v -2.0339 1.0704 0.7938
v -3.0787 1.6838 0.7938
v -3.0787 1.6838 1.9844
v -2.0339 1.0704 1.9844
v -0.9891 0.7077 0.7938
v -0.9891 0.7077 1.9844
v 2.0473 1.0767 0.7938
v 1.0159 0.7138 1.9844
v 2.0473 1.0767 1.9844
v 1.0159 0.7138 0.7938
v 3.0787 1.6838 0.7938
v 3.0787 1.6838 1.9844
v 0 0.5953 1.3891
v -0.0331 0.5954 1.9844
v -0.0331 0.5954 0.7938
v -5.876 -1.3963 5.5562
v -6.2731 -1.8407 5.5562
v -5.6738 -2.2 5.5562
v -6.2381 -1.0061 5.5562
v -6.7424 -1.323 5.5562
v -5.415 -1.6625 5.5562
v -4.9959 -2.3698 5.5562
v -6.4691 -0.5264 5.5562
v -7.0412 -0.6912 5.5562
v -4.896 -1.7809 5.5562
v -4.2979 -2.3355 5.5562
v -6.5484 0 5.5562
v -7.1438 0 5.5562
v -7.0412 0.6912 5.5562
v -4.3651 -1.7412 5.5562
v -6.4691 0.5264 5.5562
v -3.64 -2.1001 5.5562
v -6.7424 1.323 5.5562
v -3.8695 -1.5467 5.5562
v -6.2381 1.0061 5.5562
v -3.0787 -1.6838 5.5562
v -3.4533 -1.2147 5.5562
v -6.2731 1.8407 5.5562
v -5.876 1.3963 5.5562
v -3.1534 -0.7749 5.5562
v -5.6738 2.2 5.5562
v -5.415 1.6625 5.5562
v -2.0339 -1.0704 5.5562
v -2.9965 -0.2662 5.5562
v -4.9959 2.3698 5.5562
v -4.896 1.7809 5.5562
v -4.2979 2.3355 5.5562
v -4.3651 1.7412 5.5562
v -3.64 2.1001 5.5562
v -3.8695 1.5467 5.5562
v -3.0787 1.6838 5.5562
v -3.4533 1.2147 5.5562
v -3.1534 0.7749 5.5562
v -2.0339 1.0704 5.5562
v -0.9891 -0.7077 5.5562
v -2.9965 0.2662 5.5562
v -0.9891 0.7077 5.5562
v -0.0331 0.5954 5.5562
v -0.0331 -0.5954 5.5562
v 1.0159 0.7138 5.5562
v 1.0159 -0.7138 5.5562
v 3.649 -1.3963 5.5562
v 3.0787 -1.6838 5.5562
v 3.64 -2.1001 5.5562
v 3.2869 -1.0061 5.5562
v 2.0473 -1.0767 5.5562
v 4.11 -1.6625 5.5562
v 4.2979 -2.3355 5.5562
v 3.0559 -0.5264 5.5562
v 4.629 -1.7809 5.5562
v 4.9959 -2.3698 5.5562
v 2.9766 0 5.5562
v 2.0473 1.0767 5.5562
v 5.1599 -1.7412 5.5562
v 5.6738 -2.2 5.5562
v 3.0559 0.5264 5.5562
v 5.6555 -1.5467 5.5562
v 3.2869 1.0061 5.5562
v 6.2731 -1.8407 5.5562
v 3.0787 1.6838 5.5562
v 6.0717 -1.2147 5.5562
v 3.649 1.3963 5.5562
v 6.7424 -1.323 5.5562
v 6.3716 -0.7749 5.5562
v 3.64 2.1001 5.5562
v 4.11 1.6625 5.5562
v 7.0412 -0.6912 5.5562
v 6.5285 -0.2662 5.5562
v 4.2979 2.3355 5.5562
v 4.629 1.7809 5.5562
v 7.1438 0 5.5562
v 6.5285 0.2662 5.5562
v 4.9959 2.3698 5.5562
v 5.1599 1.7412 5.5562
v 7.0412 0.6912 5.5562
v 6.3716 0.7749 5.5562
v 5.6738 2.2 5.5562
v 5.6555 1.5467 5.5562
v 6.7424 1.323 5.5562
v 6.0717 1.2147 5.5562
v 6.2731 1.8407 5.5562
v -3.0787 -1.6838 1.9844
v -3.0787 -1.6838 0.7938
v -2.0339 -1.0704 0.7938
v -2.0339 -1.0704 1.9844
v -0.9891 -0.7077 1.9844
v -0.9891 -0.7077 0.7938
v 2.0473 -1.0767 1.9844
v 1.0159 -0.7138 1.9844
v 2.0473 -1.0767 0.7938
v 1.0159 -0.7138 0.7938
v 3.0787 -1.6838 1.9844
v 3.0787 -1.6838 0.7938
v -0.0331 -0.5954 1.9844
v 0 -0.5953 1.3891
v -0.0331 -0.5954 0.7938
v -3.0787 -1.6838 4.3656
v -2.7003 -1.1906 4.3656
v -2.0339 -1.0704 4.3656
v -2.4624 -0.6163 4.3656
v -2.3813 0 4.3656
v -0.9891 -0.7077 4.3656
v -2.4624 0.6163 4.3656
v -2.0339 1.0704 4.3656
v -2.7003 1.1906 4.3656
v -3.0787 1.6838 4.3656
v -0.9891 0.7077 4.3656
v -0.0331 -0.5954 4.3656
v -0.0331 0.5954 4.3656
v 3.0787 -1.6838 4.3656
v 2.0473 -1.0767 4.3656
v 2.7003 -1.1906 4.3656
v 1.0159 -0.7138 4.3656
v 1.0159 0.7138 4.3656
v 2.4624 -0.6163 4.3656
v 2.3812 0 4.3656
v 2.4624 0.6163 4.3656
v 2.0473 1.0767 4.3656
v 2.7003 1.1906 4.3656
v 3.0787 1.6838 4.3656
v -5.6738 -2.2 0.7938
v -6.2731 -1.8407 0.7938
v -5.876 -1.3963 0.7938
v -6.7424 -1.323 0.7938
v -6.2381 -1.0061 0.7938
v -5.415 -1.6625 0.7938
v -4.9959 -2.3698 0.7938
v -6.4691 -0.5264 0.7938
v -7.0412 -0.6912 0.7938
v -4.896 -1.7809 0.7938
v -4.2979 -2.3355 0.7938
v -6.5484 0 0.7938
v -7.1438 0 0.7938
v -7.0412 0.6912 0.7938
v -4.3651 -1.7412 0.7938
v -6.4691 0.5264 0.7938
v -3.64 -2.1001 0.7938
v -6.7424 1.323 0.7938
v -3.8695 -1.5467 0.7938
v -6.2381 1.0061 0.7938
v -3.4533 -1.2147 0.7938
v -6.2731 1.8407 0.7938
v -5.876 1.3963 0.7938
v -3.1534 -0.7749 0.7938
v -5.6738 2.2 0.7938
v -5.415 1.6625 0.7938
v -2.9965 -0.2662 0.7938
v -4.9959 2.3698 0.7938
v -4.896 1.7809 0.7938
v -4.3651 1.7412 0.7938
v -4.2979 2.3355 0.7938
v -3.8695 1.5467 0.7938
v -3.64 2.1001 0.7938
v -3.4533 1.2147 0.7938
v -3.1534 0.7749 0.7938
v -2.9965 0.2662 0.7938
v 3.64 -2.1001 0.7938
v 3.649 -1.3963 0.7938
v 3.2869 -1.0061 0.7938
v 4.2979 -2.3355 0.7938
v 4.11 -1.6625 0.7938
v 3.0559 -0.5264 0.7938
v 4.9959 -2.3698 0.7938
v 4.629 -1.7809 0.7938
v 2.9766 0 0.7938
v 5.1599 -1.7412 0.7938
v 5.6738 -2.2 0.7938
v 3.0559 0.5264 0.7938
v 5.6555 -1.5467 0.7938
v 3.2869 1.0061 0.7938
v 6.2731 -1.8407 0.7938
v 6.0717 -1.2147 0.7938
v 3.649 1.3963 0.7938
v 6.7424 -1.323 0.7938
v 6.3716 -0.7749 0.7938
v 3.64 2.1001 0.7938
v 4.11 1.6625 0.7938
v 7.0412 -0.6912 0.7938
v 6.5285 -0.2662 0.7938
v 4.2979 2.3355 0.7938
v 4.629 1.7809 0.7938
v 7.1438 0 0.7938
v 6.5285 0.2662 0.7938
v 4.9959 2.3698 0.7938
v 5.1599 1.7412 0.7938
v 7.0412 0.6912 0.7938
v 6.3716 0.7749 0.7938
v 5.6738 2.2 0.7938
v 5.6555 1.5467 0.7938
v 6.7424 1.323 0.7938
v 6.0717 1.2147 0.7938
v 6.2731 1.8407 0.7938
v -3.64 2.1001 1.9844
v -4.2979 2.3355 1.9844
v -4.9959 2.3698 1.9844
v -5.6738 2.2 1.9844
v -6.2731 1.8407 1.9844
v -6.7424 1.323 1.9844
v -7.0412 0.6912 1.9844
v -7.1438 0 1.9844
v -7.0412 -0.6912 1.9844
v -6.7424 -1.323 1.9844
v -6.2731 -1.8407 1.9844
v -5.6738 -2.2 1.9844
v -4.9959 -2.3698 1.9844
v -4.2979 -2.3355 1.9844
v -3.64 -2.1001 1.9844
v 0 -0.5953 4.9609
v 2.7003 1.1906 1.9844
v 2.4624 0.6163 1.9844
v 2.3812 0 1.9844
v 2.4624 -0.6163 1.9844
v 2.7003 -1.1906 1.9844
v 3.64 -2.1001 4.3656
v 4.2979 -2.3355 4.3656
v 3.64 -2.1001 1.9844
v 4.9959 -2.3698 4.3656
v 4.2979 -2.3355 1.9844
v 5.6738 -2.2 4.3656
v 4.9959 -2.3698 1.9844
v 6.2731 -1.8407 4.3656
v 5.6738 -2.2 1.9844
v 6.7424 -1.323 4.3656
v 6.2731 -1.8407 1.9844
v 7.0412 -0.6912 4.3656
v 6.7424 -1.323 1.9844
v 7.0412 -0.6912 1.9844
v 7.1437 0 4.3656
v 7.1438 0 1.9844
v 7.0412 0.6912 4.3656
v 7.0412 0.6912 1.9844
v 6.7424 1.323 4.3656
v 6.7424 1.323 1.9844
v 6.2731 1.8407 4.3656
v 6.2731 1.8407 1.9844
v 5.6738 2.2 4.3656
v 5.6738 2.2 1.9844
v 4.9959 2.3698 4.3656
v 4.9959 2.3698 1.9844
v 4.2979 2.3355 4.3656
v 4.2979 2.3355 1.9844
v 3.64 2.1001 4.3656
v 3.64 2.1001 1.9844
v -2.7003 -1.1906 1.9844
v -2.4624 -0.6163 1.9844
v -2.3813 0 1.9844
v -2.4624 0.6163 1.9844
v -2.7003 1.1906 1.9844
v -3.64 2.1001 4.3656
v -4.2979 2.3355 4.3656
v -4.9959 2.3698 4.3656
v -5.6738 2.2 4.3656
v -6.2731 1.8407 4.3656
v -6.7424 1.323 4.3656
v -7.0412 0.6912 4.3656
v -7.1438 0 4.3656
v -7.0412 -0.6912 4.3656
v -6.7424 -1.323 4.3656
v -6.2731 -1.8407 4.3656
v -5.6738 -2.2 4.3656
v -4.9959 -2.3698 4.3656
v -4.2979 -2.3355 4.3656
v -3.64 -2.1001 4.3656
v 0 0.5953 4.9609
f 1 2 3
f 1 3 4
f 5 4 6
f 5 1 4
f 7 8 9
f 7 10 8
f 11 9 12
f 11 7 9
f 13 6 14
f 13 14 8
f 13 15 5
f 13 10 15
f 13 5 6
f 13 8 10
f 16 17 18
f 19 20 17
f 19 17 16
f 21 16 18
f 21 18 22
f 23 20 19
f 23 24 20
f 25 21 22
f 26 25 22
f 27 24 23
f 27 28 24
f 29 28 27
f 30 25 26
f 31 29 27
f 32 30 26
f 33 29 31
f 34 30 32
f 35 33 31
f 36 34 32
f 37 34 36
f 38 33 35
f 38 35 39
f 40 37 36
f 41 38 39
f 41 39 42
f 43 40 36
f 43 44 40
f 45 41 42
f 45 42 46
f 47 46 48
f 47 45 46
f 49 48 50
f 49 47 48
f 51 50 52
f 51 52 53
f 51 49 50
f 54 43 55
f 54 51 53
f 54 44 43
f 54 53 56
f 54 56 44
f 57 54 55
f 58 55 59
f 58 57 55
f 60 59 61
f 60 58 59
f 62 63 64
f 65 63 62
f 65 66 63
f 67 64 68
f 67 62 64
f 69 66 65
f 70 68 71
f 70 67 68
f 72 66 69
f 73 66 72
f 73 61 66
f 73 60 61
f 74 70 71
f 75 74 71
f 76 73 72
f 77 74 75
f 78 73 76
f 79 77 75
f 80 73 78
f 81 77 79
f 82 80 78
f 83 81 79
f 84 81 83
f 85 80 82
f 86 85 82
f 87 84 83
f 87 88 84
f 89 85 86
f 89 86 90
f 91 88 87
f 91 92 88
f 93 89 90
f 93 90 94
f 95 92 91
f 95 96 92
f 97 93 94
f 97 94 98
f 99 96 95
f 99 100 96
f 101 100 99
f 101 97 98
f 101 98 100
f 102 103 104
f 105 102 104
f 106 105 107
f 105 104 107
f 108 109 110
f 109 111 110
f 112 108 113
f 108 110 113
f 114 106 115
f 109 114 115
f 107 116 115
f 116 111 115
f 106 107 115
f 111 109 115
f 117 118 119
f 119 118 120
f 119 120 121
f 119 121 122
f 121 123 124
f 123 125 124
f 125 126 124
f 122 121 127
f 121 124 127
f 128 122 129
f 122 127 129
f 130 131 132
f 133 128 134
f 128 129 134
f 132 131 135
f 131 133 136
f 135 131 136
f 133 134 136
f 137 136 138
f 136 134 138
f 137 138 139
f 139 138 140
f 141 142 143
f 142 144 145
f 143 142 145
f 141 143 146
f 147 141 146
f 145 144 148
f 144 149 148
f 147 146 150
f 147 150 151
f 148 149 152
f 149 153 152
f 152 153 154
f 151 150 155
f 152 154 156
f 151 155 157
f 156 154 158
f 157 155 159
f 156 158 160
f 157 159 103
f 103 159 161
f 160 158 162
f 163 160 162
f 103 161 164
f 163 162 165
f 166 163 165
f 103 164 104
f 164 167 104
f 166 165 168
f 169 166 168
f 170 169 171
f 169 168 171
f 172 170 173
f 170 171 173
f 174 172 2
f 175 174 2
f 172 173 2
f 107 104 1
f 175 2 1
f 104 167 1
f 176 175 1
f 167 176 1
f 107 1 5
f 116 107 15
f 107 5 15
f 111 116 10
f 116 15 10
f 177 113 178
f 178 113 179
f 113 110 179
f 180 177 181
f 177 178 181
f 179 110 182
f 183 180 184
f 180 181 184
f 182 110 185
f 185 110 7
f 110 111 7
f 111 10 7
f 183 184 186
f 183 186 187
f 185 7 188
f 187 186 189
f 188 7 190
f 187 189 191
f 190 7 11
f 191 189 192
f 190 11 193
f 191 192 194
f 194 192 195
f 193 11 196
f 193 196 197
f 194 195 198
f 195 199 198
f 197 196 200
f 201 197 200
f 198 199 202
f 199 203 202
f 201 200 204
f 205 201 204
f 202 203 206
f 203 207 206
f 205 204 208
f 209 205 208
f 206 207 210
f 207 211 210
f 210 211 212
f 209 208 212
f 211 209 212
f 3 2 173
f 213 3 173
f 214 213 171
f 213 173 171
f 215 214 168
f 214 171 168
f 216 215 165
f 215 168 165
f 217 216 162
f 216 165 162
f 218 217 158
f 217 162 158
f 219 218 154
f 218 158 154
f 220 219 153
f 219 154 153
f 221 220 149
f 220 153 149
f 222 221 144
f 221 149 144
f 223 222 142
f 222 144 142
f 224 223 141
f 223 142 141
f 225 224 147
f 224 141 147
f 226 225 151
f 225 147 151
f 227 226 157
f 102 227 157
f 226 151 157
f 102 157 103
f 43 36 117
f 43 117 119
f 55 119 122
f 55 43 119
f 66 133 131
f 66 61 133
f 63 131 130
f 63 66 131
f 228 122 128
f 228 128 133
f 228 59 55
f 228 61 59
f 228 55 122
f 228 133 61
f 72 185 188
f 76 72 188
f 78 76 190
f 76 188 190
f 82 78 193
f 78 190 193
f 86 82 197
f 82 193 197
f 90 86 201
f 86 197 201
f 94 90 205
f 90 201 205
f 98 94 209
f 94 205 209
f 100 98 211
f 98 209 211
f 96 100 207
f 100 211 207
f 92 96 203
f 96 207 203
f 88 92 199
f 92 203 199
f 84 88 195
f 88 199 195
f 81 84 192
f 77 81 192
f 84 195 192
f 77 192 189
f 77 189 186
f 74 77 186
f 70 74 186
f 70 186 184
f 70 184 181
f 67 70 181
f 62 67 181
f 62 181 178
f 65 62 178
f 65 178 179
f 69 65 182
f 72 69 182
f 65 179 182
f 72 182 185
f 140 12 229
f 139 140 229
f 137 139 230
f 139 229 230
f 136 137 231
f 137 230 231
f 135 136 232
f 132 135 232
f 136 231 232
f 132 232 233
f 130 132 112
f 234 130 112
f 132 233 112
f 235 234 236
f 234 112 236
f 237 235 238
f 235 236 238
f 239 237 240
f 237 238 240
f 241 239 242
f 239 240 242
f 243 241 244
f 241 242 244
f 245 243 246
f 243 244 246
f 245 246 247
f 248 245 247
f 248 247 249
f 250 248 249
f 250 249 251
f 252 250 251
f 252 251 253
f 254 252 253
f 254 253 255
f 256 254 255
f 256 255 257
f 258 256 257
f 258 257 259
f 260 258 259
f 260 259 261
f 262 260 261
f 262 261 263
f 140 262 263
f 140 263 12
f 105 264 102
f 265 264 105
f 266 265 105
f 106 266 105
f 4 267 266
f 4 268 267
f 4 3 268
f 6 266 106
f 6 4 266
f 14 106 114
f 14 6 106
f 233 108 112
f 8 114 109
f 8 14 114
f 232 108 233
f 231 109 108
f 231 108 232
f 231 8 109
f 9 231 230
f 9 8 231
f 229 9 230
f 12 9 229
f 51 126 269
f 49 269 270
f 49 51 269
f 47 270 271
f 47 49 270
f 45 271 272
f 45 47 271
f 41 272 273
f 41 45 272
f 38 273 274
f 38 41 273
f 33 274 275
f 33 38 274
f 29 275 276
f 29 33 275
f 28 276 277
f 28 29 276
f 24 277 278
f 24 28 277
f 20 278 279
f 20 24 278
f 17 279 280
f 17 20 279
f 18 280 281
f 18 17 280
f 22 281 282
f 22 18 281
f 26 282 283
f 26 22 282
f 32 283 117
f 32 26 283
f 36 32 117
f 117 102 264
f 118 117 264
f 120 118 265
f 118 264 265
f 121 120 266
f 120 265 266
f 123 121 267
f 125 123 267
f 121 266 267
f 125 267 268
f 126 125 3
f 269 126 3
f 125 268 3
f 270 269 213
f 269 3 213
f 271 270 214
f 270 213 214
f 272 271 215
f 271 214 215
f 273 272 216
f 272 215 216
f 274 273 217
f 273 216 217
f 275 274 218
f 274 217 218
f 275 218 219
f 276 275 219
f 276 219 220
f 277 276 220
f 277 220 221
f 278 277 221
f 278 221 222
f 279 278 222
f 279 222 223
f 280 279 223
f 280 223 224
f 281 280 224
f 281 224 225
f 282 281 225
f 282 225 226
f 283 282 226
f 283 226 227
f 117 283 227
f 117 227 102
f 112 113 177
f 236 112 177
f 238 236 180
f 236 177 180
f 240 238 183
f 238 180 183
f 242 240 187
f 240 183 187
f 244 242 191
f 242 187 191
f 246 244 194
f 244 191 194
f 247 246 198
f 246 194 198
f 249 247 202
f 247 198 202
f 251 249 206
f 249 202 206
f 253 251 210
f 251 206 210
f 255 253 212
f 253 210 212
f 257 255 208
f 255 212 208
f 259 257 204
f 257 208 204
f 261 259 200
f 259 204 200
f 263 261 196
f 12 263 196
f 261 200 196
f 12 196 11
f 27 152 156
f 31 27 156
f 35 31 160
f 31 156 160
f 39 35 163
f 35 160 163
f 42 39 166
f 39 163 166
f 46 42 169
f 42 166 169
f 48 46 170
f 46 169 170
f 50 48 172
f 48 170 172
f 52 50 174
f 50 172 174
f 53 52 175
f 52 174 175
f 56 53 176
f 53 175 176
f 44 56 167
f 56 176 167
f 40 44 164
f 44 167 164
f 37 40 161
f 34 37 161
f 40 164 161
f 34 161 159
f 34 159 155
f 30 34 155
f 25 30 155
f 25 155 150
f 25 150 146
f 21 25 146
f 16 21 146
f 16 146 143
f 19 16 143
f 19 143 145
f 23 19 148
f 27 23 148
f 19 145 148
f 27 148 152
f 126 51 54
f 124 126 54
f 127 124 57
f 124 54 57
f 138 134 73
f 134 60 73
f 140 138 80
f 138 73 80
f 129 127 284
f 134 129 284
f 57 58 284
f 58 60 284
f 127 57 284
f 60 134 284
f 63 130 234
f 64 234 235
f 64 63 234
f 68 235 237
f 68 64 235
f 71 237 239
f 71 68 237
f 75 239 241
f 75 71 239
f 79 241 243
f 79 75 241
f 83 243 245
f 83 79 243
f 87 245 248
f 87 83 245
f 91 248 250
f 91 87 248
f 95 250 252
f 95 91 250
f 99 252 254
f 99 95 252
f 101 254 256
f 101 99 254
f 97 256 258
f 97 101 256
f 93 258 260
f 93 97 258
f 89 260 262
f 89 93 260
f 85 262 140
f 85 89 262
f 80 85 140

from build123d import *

# Parameters (mm, degrees)
BOSS_EXTRUDE1_DEPTH = 1.5875
SKETCH2_R           = 3.175
BOSS_EXTRUDE2_DEPTH = 3.175
SKETCH3_R           = 2.38125
CUT_EXTRUDE1_DEPTH  = 6.35
SCALE1_SCALE        = 0.75


with BuildPart() as part:
    # Sketch1 → Boss-Extrude1 (new body)
    with BuildSketch(Plane.XY):
        with BuildLine():
            ThreePointArc((-4.10493597, 2.24506403), (-9.525, 0), (-4.10493597, -2.24506403))
            add(Edge.make_bspline(
                [(-4.10493597, -2.24506403), (0, 0.65756403), (4.10493597, -2.24506403)],
                knots=[0, 0, 0, 1, 1, 1], degree=2))
            ThreePointArc((4.10493597, -2.24506403), (9.525, 0), (4.10493597, 2.24506403))
            add(Edge.make_bspline(
                [(-4.10493597, 2.24506403), (0, -0.65756403), (4.10493597, 2.24506403)],
                knots=[0, 0, 0, 1, 1, 1], degree=2))
        make_face()
    boss_extrude1 = extrude(amount=BOSS_EXTRUDE1_DEPTH)

    # Sketch2 → Boss-Extrude2 (add)
    with BuildSketch(Plane.XY.offset(1.5875)):
        with Locations(Location((-6.35, 0, 0), (0, 0, 315))):
            Circle(SKETCH2_R)
        with Locations(Location((6.35, 0, 0), (0, 0, 135))):
            Circle(SKETCH2_R)
    extrude(amount=BOSS_EXTRUDE2_DEPTH)

    # Mirror1: Boss-Extrude1 across plane
    add(boss_extrude1.mirror(Plane.XY.offset(3.175)))

    # Sketch3 → Cut-Extrude1 (cut)
    with BuildSketch(Plane(origin=(0, 0, 0), x_dir=(-1, 0, 0), z_dir=(0, 0, -1))):
        with Locations((-6.35, 0)):
            Circle(SKETCH3_R)
        with Locations((6.35, 0)):
            Circle(SKETCH3_R)
    extrude(amount=-CUT_EXTRUDE1_DEPTH, mode=Mode.SUBTRACT)


with BuildPart() as part_1:
    # Scale1: scaled about (0, 0, 3.175)
    add(part.part.scale(SCALE1_SCALE).moved(Location((0, 0, 0.79375))))


solid = part_1.part
